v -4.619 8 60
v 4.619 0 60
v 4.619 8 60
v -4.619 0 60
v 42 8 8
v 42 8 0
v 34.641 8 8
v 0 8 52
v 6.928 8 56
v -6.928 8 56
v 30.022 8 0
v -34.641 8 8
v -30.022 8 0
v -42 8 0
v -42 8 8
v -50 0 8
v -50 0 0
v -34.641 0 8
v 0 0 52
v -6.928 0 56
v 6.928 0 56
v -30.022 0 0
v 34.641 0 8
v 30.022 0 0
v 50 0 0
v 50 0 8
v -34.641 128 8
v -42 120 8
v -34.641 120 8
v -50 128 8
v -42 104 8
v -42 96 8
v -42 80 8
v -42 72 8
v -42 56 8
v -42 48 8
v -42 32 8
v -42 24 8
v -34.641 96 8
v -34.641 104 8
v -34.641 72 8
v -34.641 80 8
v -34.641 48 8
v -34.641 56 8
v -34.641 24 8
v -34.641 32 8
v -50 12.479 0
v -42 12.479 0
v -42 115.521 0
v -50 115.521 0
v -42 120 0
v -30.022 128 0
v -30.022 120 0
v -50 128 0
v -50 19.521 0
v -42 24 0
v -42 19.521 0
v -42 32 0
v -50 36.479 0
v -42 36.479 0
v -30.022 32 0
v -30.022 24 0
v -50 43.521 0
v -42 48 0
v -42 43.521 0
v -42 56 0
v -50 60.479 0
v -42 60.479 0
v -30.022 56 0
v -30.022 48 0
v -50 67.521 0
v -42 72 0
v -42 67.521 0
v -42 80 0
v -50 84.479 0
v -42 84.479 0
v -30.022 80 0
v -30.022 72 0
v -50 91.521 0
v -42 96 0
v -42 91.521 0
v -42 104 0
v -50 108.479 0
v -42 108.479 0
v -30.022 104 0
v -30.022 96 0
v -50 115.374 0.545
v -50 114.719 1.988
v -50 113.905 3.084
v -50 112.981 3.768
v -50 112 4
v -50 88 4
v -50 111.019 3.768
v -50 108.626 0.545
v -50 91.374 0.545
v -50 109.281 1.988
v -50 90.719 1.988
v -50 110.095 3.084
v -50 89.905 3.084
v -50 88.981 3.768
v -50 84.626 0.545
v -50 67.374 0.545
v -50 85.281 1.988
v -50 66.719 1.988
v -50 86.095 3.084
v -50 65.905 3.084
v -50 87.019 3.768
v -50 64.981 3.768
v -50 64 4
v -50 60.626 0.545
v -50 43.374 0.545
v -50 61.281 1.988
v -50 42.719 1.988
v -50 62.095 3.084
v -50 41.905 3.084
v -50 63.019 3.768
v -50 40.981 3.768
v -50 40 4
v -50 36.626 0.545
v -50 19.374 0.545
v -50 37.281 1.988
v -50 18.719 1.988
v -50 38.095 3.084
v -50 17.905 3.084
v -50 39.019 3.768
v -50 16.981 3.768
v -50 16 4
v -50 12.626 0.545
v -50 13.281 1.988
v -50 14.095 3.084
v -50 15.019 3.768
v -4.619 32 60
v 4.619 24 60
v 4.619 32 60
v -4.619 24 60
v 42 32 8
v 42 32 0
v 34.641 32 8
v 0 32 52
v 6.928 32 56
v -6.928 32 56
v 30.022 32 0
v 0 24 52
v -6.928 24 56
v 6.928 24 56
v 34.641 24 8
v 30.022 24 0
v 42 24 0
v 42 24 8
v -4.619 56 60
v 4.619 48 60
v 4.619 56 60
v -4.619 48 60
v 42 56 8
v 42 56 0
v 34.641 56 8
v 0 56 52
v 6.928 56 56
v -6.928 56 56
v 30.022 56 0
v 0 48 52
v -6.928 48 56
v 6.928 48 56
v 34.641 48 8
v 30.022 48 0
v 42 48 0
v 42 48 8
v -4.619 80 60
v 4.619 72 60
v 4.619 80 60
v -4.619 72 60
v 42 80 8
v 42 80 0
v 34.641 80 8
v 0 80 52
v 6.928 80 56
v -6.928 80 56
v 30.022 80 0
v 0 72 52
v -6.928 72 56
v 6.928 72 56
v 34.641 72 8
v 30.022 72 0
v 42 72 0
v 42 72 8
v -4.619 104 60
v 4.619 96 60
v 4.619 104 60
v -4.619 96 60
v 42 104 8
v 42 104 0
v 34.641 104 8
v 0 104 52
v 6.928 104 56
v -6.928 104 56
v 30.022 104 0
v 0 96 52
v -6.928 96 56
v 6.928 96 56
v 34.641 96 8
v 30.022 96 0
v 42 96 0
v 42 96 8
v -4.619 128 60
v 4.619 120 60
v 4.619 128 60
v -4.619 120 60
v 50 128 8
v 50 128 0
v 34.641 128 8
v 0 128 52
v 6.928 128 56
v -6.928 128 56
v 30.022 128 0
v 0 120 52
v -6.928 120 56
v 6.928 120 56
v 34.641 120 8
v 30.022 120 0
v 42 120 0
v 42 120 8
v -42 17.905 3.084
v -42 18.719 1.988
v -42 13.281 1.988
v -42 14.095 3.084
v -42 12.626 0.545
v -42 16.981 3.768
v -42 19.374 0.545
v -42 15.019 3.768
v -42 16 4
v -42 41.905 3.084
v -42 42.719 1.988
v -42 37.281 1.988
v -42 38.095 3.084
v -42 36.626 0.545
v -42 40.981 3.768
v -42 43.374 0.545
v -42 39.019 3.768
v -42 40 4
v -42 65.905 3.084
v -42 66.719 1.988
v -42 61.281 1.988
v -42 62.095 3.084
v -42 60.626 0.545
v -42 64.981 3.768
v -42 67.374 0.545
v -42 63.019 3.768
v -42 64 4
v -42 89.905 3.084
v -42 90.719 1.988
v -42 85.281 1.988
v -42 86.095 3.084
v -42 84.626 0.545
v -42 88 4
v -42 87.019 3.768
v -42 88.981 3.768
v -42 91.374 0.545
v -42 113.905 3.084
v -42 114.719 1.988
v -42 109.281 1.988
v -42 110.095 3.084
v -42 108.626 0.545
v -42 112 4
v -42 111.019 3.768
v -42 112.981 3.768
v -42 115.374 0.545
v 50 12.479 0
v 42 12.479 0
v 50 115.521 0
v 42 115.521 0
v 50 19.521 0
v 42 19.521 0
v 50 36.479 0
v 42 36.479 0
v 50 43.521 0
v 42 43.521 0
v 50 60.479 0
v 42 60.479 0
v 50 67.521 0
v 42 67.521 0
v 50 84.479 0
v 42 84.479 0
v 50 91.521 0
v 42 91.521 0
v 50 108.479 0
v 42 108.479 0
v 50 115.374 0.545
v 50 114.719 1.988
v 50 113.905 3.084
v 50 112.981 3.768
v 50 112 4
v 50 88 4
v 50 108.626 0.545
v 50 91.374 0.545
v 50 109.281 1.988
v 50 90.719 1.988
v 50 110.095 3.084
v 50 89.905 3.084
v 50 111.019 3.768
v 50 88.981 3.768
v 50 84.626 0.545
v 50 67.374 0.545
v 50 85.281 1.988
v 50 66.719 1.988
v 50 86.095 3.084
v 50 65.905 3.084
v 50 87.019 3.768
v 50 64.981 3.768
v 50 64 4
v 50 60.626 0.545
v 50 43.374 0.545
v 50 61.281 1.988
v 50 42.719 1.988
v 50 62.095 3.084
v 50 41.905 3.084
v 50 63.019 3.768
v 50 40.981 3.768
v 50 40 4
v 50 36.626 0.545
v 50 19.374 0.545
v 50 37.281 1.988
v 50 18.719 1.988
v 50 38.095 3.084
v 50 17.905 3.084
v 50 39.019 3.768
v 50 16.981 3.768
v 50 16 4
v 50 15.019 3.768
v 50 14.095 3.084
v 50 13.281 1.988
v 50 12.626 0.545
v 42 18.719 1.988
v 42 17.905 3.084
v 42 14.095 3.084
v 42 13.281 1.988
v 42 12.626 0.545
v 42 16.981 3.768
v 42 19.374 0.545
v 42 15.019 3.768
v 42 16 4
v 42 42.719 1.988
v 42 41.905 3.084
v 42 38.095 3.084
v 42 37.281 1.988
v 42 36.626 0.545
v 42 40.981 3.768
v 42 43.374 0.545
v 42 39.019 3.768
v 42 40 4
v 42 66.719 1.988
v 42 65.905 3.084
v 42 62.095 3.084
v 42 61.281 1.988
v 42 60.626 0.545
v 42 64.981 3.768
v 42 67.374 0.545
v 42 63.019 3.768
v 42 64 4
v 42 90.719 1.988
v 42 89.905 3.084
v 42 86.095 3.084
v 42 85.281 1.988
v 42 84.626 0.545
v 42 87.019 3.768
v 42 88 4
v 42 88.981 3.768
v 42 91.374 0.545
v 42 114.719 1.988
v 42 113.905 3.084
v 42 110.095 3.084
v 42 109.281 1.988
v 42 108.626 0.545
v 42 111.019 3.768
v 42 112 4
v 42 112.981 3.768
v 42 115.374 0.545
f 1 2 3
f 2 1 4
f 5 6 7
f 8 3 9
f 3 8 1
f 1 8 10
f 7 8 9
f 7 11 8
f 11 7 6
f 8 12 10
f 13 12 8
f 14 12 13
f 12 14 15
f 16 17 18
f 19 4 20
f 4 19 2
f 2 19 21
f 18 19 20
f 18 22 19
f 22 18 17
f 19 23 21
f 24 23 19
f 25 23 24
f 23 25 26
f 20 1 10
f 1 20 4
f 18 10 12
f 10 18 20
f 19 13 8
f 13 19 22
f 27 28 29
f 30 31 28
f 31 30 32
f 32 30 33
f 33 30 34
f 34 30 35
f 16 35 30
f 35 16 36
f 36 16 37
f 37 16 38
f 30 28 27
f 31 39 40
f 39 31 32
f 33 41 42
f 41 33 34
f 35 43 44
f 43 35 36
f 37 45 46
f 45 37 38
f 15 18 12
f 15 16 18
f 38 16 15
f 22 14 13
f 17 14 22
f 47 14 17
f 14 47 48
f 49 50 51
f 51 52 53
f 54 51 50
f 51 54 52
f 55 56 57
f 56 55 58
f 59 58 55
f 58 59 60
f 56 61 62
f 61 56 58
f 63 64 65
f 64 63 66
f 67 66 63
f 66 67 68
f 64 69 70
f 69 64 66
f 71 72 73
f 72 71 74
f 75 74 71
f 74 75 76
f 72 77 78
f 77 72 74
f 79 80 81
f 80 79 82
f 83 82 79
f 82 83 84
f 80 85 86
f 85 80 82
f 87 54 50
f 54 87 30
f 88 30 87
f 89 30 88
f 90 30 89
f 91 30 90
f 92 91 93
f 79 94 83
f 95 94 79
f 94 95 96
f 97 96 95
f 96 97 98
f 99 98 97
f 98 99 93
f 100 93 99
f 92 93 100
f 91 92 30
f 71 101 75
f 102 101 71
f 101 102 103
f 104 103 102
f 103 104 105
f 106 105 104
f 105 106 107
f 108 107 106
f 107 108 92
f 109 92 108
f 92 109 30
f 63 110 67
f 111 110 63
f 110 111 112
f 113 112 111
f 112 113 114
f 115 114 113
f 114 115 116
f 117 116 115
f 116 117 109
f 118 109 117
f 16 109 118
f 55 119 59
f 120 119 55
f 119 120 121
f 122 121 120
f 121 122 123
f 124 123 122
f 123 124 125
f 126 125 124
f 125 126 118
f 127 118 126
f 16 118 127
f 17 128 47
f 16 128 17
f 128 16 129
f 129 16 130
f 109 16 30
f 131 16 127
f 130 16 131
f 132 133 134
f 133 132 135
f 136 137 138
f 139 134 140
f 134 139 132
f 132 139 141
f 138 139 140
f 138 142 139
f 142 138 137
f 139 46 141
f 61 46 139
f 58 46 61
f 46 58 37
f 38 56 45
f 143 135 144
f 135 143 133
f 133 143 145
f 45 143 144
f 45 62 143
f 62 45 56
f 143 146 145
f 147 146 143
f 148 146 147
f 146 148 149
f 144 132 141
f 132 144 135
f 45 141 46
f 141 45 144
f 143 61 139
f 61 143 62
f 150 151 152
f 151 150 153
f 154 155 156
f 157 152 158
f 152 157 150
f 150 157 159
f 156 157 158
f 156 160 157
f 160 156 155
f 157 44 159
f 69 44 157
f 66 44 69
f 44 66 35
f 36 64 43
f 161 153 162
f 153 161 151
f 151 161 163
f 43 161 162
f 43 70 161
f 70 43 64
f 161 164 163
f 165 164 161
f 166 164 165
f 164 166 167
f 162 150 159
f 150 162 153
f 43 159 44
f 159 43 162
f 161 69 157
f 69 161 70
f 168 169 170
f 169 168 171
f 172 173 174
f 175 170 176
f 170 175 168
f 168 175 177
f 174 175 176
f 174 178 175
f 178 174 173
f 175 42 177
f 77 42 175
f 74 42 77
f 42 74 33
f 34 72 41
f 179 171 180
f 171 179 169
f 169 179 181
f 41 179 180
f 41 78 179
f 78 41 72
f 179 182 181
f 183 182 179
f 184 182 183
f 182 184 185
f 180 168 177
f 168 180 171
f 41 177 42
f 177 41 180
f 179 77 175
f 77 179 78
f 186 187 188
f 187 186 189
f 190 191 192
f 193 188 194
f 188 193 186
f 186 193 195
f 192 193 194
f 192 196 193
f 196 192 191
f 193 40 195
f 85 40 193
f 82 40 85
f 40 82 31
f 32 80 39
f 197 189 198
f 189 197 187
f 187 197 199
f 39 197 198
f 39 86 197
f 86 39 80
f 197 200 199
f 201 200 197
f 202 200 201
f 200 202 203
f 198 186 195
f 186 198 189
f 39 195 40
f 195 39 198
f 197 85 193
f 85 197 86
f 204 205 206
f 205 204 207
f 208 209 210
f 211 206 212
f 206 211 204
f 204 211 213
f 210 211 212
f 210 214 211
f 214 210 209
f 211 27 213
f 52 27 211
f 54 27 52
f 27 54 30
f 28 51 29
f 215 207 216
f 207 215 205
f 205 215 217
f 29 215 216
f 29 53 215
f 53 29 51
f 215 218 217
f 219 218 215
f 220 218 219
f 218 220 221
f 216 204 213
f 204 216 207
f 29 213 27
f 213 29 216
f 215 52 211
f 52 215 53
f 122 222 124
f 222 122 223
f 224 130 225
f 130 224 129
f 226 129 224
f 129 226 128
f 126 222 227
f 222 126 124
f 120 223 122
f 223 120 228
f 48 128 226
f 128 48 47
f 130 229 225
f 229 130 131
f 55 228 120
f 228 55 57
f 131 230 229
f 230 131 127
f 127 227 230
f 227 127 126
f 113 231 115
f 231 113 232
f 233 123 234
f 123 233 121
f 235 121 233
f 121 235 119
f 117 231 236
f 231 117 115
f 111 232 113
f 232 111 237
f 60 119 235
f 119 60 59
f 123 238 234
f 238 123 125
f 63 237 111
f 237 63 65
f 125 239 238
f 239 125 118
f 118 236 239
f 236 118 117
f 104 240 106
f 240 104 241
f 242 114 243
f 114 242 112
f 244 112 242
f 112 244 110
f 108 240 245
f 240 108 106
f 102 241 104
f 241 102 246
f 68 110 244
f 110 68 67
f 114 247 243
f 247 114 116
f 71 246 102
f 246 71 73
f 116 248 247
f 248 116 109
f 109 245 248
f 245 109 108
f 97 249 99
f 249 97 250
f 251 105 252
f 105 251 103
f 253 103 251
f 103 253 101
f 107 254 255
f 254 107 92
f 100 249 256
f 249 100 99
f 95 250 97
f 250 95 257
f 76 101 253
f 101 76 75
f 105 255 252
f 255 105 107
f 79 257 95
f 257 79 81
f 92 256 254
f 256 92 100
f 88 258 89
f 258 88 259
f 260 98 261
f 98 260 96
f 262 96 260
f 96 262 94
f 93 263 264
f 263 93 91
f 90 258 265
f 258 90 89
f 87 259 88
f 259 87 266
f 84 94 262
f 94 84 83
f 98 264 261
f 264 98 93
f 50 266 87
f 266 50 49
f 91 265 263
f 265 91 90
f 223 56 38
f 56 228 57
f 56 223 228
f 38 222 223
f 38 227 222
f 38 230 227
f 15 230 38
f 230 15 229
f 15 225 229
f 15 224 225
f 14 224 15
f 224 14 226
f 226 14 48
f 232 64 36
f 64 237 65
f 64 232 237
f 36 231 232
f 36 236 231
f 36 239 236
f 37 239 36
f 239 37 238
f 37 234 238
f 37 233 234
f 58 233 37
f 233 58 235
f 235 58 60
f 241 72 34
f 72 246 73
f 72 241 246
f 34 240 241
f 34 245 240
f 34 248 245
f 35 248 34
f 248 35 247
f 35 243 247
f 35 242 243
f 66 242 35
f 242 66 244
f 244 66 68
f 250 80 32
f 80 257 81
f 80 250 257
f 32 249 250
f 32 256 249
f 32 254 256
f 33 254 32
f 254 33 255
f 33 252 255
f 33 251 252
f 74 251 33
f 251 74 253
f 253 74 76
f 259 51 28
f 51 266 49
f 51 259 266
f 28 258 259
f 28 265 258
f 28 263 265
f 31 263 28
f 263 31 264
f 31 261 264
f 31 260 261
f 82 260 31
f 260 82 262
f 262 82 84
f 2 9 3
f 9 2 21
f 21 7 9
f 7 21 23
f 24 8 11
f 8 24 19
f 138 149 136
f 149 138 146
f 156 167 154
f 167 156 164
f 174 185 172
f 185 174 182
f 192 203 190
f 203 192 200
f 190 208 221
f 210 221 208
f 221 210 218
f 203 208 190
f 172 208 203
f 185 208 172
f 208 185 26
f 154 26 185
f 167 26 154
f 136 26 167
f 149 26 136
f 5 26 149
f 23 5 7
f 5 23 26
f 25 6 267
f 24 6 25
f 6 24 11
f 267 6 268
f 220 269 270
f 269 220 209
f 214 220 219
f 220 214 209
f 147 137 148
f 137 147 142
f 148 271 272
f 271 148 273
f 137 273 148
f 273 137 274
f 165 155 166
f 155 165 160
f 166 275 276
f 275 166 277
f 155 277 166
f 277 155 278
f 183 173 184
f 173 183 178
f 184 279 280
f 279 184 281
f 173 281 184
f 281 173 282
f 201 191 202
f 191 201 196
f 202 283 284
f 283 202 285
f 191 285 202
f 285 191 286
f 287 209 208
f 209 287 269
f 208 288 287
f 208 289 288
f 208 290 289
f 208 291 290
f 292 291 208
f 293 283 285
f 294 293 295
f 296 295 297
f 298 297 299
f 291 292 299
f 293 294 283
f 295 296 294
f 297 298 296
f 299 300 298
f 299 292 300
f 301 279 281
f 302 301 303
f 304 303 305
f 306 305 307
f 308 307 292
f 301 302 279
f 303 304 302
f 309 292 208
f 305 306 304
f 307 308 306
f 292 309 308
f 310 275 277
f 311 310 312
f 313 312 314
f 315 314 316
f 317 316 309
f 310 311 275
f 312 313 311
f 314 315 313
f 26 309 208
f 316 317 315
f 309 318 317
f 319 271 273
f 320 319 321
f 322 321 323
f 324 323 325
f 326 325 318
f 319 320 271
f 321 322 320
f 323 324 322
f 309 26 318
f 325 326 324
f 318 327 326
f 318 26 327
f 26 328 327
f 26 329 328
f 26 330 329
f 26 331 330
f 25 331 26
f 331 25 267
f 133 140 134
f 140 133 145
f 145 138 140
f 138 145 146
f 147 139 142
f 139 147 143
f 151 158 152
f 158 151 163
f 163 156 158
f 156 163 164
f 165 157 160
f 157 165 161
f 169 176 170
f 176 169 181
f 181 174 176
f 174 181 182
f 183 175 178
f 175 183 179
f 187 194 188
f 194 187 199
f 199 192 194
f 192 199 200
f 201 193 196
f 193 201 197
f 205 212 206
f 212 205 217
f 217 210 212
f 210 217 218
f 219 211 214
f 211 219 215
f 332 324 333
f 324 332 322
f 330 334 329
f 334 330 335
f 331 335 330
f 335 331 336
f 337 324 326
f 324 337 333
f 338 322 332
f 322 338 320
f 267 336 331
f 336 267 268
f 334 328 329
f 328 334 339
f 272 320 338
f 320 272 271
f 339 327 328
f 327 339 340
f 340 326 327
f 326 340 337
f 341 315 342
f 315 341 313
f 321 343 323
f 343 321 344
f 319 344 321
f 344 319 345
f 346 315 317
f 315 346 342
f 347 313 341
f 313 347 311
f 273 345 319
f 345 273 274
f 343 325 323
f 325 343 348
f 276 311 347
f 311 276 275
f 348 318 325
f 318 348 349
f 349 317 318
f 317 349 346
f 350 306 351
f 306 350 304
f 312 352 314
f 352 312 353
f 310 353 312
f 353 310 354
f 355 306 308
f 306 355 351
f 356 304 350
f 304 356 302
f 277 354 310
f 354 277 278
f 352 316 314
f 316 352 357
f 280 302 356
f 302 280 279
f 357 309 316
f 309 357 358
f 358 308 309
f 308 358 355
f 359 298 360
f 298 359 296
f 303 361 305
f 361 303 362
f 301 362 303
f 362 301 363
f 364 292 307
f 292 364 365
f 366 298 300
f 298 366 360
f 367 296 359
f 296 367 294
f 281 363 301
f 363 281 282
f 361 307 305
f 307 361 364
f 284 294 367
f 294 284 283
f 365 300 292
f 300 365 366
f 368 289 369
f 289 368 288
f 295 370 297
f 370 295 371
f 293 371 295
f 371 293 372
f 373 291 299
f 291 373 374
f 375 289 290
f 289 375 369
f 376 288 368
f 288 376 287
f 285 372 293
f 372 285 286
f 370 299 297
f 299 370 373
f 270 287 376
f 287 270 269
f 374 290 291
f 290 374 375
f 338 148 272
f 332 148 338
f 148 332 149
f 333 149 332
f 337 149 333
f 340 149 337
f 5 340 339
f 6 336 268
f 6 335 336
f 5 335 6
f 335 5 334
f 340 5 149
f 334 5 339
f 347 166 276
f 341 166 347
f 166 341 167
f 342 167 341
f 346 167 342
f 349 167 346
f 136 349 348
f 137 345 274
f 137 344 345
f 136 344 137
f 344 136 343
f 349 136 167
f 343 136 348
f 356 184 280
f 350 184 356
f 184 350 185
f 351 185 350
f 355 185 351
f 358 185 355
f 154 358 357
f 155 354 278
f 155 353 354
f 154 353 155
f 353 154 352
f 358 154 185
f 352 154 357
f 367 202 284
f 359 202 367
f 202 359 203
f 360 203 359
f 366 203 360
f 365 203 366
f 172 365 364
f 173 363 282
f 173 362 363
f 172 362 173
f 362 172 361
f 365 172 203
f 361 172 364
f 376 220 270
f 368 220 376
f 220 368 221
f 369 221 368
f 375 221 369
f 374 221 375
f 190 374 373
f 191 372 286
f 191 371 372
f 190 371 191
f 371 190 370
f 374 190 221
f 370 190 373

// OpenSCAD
// Side to side width of the rack
length = 100;

// Max height of each section divider
height = 60;

// Angle of the divider. Keep it steep to print without supports.
angle = 60;

// Number of devices to hold
num_devices = 5;

// Size in mm of each device to hold. Must match num_devices. Allow ~1mmmm so it's not too tight.
widths = [16, 16, 16, 16, 16];

// Thickness of the parts. I don't recommend changing this.
thickness = 8;


// find the sublist of 'list' with indices from 'from' to 'to' 
function sublist(list, from=0, to) =
    let( end = (to==undef ? len(list)-1 : to) )
    [ for(i=[from:end]) list[i] ];

// sum all the items in a sublist
function add(v, i = 0, r = 0) = i < len(v) ? add(v, i + 1, r + v[i]) : r;

// Distances at which to place the dividers. This is calculated by doing adding all elements oof each sublist in widths. This is way more complicated than it should be, but I could not find a simpler way.

count = num_devices <  len(widths) ? num_devices : len(widths);
   
distances = [for (idx = [ 0 : count - 1 ] ) add(sublist(widths, 0, idx)) + (thickness * (idx+1)) ];  
  


module oval(w,h, height, center = false) {
 scale([1, h/w, 1]) cylinder(h=height, r=w, center=center);
}


/**
 * The angled part and the foot of a section divider.
 *
 * This is composed of bar rotated vertically by angle, a top hat that closes it on top, and
 * a foot that extends out to cmplete length/2
 */
module half_divider() {
    //                  /|
    //  c              / | a (height) 
    // (length)       /  |
    //               /   |
    //               -----
    //            b (width)
    
    // top hat: closes the arm at the top so it has a flat top
    //hat_width = thickness * sin(angle);
    hat_height = thickness * cos(angle) * 2;
    
    // Adjust the arm height to account to for the top hat
    calc_height = height - hat_height;
    
    top_hat();
    
    // Hypotenuse of the triangle rectangle
    arm_length = calc_height / sin(angle);
    
    // Base of the triangle rectangle
    base = arm_length * sin(90-angle);
    
    translate([-base, 0, 0])         
    rotate([0, -angle, 0])
    cube([arm_length, thickness, thickness]);
    
    foot_length = (length/2) - base;
    translate([-base - foot_length, 0, 0]) cube([foot_length, thickness, thickness]);
}

module top_hat() {
    
    // top hat: closes the arm at the top so it has a flat top
    hat_width = thickness * sin(angle);
    hat_height = thickness * cos(angle) * 2;
    
    // Adjust the arm height to account to for the top hat
    calc_height = height - hat_height;
    
    // Hypotenuse of the triangle rectangle
    arm_length = calc_height / sin(angle);
    
    // Base of the triangle rectangle
    base = arm_length * sin(90-angle);
  
    intersection() {
        translate([-hat_width, 0, calc_height]) cube([hat_width, thickness, hat_height]);
        
        translate([-base, 0, 0])         
        rotate([0, -angle, 0])
        cube([arm_length * 4, thickness, thickness]);
    }
    
}

/**
 * Build the sidebar
 *
 * Horizontal bar that joins the dividers together and with wires cutout in the middle of each hole
 */
module sidebar() {
     difference() {
        
        // A long bar that cuts across the feet of the dividers
        translate([-length/2, 0, 0]) cube([thickness, distances[len(distances) - 1]+thickness, thickness]);
        
        // Each cutout is a bar rotated 45 degrees lenghtwise, and translated down on Z so only the top part cuts the sidebar
        union() {
            for (idx = [ 0 : len(distances) - 1 ] ) {        
                distance = distances[idx];
                width = widths[idx];
                translate([-length/2-1, distance - width/2, -4]) rotate([0, 90, 0]) oval(thickness, 4.1, thickness + 2);
                //cube([thickness +2, thickness, thickness]); 
            }
        }   
         
     }
}


module half_rack() {
    // lay out the dividers
    half_divider();    
    for (idx = [ 0 : len(distances) - 1 ] ) {        
        distance = distances[idx];
        translate([0, distance, 0]) half_divider();
    }    
    // add the sidebar
    sidebar();
}


union() {
    half_rack();
    mirror([1, 0, 0]) half_rack();
}
